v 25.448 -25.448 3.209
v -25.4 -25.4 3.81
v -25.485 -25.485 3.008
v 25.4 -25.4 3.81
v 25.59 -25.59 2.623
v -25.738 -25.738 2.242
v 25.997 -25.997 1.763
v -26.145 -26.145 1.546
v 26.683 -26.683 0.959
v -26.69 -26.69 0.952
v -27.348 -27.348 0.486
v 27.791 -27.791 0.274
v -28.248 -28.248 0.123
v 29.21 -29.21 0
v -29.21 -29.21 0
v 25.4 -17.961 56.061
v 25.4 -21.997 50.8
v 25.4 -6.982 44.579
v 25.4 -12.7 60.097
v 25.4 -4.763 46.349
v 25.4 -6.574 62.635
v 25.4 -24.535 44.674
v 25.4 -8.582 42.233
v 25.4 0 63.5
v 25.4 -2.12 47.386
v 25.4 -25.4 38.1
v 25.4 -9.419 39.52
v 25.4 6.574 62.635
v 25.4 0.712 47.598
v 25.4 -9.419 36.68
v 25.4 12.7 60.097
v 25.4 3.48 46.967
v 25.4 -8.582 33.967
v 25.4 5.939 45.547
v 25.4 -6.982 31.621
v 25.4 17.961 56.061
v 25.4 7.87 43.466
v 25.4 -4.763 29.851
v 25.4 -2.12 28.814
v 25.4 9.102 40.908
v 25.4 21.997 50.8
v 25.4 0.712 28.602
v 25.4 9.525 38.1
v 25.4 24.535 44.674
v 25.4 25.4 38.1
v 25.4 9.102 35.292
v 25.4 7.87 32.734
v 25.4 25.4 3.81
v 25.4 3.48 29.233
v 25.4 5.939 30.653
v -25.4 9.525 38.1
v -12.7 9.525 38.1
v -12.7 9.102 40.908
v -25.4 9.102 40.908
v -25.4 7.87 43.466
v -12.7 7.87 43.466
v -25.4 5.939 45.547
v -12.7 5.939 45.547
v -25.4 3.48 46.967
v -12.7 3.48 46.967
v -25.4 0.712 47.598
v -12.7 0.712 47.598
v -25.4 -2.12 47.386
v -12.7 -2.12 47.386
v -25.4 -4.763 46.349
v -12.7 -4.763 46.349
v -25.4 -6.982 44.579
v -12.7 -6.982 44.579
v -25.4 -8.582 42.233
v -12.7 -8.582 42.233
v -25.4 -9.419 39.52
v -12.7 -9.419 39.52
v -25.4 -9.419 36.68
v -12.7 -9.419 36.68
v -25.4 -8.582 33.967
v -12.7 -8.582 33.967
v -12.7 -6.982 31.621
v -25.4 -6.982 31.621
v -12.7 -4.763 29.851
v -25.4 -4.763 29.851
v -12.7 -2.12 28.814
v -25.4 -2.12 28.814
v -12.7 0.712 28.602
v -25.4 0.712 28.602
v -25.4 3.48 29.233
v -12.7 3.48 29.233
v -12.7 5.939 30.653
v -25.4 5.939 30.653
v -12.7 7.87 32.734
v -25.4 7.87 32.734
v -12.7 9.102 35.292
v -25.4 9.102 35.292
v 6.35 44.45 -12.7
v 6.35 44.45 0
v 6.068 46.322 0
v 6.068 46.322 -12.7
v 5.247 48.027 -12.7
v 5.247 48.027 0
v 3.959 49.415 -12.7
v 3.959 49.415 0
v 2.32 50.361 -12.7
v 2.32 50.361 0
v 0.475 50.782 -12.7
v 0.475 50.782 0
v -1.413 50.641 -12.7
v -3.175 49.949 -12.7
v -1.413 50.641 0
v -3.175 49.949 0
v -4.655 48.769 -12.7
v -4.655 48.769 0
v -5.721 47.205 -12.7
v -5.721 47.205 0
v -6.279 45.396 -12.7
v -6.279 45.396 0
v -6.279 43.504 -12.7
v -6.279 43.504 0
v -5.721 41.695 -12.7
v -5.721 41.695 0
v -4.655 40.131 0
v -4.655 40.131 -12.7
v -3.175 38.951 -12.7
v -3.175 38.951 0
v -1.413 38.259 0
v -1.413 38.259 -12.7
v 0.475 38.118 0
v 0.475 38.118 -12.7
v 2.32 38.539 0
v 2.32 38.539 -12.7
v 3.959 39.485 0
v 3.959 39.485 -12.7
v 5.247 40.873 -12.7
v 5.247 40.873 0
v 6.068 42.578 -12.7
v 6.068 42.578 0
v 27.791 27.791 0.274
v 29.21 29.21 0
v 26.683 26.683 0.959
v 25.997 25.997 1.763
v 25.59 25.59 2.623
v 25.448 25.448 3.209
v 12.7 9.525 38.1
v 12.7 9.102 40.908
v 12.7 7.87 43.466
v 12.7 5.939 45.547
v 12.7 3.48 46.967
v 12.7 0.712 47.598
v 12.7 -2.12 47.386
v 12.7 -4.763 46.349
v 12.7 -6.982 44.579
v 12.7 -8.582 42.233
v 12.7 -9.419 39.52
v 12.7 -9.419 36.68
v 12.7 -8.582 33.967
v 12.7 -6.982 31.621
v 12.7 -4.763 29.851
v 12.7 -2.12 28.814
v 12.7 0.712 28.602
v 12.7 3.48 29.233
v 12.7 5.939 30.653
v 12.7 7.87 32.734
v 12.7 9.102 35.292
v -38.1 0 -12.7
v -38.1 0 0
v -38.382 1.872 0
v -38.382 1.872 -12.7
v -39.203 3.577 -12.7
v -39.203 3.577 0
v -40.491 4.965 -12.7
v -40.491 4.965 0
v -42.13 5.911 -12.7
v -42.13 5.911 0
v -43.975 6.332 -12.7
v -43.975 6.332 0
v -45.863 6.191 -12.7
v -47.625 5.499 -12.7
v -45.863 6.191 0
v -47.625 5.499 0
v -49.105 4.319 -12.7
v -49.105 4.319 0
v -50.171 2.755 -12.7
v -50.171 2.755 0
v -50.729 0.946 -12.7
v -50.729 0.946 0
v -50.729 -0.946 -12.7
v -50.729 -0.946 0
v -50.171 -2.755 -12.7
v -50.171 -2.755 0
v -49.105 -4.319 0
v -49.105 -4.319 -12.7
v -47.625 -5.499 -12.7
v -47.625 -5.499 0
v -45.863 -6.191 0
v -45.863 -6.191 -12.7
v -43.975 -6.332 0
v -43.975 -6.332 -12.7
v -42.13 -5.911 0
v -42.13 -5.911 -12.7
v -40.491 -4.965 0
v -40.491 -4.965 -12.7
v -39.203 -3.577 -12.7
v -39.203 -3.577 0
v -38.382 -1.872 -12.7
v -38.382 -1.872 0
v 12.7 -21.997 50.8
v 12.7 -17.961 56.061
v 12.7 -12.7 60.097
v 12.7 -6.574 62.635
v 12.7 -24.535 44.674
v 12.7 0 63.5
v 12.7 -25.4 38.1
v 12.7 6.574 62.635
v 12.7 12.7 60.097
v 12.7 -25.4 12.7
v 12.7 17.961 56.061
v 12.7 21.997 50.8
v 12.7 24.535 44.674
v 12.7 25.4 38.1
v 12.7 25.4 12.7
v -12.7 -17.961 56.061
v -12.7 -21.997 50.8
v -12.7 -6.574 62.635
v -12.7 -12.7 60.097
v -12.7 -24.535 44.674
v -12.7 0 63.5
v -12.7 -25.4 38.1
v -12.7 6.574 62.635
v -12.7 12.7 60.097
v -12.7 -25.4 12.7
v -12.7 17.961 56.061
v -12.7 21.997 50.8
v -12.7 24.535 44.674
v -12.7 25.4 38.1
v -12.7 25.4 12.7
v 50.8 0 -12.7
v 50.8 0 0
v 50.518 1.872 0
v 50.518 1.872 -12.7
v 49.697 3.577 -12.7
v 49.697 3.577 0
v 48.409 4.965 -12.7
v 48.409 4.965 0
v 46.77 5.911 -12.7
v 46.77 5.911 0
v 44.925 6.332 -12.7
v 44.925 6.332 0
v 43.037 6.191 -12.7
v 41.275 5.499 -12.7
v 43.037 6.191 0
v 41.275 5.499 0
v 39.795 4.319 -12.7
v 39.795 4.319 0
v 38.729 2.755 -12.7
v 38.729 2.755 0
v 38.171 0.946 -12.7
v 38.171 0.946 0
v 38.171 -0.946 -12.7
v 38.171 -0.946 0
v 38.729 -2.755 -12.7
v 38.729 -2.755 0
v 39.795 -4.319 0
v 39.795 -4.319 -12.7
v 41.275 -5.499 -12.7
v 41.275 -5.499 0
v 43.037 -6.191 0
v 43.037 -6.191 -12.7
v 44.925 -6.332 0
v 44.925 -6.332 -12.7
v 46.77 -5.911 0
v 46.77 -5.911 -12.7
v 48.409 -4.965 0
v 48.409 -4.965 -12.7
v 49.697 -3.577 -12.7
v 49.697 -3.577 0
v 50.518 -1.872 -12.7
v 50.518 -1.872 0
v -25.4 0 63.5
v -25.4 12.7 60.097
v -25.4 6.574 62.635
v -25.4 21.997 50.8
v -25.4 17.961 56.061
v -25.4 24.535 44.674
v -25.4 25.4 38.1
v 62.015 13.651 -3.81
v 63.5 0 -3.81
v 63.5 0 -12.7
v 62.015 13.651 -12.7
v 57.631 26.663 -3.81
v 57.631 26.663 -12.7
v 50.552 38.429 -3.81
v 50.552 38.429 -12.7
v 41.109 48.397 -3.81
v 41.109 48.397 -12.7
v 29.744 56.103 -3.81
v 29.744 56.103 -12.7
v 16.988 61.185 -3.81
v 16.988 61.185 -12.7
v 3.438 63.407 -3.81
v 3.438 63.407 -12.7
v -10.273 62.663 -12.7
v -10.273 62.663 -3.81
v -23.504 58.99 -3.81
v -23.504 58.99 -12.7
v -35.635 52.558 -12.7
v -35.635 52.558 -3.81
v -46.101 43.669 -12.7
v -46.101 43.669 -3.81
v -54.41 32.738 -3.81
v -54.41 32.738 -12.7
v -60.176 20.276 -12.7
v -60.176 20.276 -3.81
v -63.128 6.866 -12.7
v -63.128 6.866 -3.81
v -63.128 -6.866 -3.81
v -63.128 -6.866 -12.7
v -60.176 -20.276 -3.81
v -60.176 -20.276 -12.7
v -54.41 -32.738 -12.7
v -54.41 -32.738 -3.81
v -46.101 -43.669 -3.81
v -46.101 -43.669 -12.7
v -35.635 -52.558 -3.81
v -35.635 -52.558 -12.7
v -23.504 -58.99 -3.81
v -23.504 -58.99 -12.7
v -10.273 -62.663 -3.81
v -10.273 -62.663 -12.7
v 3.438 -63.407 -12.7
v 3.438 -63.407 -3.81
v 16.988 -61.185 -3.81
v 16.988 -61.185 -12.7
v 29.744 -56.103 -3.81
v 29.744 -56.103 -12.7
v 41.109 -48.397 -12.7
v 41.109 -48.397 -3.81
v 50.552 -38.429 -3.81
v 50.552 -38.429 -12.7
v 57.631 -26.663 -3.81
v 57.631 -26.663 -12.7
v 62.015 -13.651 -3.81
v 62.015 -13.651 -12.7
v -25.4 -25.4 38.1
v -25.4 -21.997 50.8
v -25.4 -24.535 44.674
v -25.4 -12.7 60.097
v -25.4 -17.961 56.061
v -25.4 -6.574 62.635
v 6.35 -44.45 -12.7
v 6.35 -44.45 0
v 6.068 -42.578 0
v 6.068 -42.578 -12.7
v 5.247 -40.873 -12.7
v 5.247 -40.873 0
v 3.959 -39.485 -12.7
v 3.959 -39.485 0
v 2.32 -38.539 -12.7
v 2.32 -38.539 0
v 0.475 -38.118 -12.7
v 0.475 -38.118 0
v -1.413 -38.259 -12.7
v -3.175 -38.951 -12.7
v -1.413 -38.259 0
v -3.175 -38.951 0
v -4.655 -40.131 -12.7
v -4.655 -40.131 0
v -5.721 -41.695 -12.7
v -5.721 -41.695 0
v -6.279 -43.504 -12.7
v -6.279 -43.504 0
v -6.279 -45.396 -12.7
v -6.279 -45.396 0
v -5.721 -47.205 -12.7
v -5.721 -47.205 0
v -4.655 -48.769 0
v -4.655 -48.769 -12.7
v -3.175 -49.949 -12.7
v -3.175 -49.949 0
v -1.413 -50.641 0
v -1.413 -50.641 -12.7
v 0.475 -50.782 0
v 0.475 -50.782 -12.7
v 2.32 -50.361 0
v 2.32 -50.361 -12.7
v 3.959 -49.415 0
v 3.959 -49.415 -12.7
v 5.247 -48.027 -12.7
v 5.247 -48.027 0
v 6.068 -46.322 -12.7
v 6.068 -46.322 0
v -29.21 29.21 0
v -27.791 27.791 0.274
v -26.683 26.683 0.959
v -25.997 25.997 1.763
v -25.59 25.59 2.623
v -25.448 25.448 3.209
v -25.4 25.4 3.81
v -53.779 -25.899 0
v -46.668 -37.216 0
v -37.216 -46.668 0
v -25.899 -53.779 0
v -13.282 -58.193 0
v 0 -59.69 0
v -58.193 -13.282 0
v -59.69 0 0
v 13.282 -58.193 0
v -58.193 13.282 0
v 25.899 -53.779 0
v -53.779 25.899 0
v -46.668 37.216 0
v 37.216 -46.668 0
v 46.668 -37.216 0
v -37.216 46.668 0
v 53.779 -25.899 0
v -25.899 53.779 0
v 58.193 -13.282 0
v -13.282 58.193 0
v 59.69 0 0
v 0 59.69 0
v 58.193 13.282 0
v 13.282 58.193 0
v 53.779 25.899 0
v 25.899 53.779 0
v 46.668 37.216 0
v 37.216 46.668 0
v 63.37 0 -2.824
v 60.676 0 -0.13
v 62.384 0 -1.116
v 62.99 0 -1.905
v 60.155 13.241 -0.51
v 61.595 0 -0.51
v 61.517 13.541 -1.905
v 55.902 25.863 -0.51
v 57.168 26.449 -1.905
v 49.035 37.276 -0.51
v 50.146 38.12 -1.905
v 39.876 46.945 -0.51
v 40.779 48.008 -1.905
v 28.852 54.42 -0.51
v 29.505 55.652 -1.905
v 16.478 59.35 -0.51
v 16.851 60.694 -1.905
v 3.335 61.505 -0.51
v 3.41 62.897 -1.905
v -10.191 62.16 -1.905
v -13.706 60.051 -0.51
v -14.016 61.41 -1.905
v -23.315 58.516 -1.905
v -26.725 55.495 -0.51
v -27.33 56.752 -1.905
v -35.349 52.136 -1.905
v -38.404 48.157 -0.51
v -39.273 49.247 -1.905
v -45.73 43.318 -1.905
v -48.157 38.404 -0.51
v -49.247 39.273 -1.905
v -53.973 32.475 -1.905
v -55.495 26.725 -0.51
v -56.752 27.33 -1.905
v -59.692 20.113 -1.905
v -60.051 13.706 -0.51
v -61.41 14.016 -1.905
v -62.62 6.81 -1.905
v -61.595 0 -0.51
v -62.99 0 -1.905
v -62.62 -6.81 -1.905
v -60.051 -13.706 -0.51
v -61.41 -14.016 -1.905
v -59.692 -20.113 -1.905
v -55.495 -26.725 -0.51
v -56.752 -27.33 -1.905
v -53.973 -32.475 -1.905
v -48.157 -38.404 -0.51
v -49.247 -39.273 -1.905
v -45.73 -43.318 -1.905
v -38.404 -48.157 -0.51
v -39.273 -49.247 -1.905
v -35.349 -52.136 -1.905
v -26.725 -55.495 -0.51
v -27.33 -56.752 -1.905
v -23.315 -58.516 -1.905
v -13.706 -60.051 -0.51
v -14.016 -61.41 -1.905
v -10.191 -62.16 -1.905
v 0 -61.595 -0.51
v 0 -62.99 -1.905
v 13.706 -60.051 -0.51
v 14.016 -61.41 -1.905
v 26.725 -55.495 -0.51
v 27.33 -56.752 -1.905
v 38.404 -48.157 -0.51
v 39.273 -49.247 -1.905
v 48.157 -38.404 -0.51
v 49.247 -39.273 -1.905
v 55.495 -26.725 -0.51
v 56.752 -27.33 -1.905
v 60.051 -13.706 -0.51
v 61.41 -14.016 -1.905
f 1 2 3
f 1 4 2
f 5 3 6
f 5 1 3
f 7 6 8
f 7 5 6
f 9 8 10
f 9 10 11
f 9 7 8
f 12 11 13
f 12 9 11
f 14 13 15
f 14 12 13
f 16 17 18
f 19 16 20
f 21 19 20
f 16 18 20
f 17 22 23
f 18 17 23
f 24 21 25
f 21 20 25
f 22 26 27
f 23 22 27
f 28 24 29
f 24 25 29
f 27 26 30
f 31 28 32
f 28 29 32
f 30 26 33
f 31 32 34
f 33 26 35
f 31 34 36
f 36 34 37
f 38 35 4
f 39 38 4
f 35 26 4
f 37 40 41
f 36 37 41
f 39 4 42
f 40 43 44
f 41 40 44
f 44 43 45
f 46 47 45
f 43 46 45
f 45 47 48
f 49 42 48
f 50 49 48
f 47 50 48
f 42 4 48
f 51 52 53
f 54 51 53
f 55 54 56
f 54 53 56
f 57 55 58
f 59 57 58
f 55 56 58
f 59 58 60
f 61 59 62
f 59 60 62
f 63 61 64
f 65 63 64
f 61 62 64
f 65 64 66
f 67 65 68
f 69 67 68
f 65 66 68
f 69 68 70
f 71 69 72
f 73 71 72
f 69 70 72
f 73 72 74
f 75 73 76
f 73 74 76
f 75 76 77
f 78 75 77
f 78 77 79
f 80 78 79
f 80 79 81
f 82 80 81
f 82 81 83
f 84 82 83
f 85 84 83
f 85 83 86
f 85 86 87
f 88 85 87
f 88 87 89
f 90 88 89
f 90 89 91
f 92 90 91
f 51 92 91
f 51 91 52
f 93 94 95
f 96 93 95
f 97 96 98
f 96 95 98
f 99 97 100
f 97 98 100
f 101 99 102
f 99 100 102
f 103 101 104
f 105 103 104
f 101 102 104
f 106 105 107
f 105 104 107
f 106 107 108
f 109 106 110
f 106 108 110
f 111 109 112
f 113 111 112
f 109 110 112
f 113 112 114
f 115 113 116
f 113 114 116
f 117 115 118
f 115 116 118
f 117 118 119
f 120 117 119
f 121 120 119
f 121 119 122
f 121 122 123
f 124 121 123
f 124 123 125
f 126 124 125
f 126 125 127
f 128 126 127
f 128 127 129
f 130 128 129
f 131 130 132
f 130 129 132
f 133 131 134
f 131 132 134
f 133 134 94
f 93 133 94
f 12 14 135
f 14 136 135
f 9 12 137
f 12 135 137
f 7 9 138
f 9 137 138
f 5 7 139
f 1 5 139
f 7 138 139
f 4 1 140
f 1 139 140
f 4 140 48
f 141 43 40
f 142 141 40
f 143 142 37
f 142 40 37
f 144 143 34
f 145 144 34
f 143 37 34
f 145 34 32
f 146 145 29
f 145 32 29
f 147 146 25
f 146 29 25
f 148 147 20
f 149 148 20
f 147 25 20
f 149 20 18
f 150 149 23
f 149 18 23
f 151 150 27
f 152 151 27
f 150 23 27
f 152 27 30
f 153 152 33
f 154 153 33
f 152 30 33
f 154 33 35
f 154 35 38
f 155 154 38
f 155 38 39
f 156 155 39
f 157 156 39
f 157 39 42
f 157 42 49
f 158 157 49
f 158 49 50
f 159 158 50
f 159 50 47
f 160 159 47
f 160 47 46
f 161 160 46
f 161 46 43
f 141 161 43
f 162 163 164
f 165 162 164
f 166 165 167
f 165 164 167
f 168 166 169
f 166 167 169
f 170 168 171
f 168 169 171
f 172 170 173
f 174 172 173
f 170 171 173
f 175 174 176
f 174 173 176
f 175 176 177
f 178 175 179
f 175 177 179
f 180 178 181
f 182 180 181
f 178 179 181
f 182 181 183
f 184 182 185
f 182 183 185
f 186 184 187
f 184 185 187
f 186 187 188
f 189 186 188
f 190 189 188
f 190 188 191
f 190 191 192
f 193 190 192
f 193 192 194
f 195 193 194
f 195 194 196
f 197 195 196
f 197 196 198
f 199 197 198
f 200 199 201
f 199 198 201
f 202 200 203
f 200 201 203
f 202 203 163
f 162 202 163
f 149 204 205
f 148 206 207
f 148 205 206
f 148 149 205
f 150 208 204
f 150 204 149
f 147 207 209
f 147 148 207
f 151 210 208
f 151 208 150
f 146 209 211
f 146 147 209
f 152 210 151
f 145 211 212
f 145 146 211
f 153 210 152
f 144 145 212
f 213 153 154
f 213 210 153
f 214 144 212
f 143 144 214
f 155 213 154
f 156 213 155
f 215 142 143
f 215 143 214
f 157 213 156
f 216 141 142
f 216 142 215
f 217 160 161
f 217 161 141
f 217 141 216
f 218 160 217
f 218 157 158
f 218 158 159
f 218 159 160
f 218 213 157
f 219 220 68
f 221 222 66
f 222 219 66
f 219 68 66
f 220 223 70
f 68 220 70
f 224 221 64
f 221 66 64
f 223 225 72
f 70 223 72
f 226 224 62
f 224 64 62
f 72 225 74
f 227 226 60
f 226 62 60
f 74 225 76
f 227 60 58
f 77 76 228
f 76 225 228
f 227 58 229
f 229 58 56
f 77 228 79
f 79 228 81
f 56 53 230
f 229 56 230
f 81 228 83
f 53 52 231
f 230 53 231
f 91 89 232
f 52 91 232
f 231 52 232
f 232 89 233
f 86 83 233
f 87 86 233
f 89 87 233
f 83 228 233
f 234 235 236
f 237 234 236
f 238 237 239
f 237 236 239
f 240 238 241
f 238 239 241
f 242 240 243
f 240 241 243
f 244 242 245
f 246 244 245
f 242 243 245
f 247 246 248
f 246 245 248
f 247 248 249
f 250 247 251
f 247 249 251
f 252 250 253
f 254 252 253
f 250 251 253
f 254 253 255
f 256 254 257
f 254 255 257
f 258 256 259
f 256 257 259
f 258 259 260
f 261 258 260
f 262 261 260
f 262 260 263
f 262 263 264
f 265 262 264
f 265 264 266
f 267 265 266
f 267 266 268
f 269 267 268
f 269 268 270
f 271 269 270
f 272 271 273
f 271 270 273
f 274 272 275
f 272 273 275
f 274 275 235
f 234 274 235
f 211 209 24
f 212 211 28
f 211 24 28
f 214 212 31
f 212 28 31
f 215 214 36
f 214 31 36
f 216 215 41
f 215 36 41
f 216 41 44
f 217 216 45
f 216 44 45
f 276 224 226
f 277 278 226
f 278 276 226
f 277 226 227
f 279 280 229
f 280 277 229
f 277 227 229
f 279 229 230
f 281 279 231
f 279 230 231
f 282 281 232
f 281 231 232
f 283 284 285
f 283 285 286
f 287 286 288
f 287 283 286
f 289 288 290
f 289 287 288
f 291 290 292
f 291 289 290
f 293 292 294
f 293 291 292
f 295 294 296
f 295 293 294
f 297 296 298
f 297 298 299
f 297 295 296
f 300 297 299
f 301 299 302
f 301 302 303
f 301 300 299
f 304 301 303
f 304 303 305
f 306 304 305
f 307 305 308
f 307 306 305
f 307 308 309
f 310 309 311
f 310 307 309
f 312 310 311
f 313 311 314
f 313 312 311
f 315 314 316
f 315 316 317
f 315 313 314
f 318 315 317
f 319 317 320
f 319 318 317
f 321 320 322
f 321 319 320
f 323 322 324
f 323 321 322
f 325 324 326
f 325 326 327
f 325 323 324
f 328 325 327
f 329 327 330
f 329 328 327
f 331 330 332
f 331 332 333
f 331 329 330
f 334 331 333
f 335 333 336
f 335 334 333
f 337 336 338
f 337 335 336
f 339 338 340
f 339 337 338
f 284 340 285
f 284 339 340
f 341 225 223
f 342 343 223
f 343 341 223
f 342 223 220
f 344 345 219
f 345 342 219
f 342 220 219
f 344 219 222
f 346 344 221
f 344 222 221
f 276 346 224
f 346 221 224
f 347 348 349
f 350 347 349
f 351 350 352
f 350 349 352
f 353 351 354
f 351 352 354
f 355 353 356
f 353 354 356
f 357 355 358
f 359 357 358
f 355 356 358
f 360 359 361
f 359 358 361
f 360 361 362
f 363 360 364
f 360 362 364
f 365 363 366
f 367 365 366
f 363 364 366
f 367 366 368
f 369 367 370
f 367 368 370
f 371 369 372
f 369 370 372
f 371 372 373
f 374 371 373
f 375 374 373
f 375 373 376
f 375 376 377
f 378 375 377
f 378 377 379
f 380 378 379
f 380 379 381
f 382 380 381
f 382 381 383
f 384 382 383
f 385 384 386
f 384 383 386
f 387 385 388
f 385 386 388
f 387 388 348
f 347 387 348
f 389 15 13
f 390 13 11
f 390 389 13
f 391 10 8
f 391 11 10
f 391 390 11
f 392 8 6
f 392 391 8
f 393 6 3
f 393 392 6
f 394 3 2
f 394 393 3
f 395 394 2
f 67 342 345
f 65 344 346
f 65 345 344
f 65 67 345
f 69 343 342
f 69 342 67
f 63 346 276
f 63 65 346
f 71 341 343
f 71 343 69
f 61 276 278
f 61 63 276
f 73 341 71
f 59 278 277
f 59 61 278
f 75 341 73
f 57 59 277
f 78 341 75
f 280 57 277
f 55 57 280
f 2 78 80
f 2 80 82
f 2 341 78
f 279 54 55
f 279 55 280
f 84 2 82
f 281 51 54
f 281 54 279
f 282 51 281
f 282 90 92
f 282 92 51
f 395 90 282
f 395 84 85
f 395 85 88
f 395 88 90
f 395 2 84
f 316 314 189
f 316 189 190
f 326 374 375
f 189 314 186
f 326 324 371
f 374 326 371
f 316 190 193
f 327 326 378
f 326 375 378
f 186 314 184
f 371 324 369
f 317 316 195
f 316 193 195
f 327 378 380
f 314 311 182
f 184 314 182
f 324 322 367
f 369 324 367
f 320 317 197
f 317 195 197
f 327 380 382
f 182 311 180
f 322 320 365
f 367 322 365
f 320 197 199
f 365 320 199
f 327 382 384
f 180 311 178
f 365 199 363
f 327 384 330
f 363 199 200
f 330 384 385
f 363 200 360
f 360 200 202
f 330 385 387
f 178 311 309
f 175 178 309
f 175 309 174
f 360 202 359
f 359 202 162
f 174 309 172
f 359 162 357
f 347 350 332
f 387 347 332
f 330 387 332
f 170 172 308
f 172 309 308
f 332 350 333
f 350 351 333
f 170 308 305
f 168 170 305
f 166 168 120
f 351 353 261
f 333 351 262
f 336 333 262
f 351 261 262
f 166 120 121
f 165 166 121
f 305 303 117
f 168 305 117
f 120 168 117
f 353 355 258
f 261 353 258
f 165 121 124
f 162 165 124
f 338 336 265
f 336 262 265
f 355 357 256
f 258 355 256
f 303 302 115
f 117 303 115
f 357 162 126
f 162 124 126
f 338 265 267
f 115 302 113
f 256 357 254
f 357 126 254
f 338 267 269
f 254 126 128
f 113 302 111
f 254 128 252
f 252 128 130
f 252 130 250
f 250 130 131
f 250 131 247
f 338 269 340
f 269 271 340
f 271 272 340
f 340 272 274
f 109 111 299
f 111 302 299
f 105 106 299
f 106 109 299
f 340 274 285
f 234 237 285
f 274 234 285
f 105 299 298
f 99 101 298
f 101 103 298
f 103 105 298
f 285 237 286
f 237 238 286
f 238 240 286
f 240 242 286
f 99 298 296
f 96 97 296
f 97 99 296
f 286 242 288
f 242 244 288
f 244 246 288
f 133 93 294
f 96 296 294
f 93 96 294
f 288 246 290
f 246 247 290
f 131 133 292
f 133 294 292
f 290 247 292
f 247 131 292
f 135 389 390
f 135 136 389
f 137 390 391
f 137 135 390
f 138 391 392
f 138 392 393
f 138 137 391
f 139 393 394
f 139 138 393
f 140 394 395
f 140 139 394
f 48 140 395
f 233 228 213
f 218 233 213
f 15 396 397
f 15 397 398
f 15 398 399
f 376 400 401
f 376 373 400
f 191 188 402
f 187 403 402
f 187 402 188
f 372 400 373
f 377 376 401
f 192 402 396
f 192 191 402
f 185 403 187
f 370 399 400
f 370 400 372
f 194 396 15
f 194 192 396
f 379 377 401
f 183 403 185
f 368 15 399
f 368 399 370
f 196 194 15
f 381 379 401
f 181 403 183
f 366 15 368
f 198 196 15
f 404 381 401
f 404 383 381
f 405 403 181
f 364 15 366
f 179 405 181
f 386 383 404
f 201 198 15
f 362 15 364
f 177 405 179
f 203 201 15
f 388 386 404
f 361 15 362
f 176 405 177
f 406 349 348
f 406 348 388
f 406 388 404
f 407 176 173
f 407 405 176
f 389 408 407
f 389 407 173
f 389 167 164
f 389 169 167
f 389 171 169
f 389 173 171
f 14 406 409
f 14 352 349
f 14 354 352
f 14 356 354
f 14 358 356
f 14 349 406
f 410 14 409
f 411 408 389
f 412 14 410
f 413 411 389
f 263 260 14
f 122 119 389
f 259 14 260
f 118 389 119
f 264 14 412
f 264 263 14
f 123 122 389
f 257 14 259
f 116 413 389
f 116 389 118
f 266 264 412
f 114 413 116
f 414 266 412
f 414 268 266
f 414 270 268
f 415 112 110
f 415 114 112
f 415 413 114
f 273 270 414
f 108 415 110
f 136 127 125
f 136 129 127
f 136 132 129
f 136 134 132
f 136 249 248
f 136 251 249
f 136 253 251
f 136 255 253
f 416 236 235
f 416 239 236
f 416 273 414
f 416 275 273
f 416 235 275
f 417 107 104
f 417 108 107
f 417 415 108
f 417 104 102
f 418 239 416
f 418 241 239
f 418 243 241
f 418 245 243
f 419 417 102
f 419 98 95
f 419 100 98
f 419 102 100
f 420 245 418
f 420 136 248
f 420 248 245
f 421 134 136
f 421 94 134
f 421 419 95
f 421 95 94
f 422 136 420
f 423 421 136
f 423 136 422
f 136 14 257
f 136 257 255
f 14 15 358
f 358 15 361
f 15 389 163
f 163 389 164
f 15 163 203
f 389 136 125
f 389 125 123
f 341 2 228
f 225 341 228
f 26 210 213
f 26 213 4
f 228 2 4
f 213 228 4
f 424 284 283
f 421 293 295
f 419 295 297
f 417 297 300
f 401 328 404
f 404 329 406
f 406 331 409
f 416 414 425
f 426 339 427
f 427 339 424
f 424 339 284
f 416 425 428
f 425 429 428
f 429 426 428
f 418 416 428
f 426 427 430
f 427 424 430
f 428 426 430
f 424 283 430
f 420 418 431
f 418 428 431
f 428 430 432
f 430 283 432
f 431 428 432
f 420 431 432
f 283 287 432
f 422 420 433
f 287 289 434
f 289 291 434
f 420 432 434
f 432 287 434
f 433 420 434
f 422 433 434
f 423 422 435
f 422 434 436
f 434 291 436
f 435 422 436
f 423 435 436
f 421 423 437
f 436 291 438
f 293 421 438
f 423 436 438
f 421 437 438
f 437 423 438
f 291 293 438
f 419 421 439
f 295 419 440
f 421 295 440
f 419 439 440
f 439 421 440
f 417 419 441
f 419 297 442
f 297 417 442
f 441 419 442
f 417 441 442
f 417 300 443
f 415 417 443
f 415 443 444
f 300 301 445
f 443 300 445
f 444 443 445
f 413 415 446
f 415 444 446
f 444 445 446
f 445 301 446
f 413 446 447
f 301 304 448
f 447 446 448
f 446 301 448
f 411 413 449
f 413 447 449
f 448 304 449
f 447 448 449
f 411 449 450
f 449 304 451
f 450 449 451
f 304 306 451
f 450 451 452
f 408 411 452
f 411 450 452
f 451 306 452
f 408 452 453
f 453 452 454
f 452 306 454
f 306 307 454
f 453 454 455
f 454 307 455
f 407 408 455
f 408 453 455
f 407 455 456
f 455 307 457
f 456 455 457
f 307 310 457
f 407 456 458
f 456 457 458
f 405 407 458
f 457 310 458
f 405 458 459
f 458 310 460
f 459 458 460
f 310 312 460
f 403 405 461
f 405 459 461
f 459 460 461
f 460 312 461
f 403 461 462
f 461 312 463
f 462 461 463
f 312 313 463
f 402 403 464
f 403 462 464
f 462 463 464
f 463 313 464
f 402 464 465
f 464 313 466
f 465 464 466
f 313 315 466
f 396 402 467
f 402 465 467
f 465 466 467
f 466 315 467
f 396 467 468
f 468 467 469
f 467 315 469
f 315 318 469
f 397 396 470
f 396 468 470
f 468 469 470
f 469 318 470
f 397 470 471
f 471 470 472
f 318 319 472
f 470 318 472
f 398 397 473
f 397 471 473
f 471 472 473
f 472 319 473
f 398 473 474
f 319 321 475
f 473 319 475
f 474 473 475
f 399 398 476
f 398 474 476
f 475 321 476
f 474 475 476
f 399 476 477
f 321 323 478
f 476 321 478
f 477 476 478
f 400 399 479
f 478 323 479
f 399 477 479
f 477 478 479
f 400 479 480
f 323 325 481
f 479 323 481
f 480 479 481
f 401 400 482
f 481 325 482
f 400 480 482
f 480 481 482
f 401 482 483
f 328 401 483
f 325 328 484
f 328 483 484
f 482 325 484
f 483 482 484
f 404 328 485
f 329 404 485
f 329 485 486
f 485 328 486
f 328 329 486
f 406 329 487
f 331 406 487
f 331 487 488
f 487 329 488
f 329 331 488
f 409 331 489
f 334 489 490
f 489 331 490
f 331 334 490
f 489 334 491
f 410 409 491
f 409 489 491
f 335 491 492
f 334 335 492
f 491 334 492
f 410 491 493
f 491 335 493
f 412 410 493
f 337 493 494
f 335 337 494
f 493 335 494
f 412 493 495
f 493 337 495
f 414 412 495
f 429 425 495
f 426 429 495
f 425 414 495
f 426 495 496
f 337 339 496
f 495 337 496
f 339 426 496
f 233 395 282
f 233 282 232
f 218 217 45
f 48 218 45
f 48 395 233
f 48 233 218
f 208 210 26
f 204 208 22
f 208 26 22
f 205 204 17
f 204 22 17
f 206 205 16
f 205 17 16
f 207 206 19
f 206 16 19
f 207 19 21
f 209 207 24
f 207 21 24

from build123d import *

# Parameters (mm, degrees)
F0_R     = 63.5
F0_R_2   = 6.35
F0_W     = 12.7
F0_H     = 50.8
F0_W_2   = 25.4
F1_DEPTH = 12.7
F2_DEPTH = 63.5
F3_DEPTH = 12.7
F5_DEPTH = 88.901
F4_R     = 9.525
F6_DEPTH = 88.901
F7_R     = 3.81


with BuildPart() as f1:
    # F0 (on Top) → F1 (new body)
    with BuildSketch(Plane.XY):
        Circle(F0_R)
        with Locations((0, -44.45)):
            Circle(F0_R_2, mode=Mode.SUBTRACT)
        with Locations((-44.45, 0)):
            Circle(F0_R_2, mode=Mode.SUBTRACT)
        Polygon((-25.4, -25.4), (-25.4, 25.4), (-12.7, 25.4), (12.7, 25.4), (25.4, 25.4), (25.4, -25.4), (12.7, -25.4), (-12.7, -25.4), align=None, mode=Mode.SUBTRACT)
        with Locations((44.45, 0)):
            Circle(F0_R_2, mode=Mode.SUBTRACT)
        with Locations((0, 44.45)):
            Circle(F0_R_2, mode=Mode.SUBTRACT)
        with Locations((-19.05, 0)):
            Rectangle(F0_W, F0_H)
        Rectangle(F0_W_2, F0_H)
        with Locations((19.05, 0)):
            Rectangle(F0_W, F0_H)
    extrude(amount=-F1_DEPTH)

    # F0 (on Top) → F2 (join)
    with BuildSketch(Plane.XY):
        with Locations((-19.05, 0)):
            Rectangle(F0_W, F0_H)
        with Locations((19.05, 0)):
            Rectangle(F0_W, F0_H)
    extrude(amount=F2_DEPTH)

    # F0 (on Top) → F3 (join)
    with BuildSketch(Plane.XY):
        Rectangle(F0_W_2, F0_H)
    extrude(amount=F3_DEPTH)

    # F4 (on face) → F5 (cut, through all)
    with BuildSketch(Plane.YZ.offset(25.4)):
        with BuildLine():
            Line((-25.4, 63.5), (-25.4, 38.1))
            ThreePointArc((-25.4, 38.1), (-17.960512, 56.060512), (0, 63.5))
            Line((0, 63.5), (-25.4, 63.5))
        make_face()
        with BuildLine():
            ThreePointArc((0, 63.5), (17.960512, 56.060512), (25.4, 38.1))
            Line((25.4, 38.1), (25.4, 63.5))
            Line((25.4, 63.5), (0, 63.5))
        make_face()
    extrude(amount=-F5_DEPTH, mode=Mode.SUBTRACT)

    # F4 (on face) → F6 (cut, through all)
    with BuildSketch(Plane.YZ.offset(25.4)):
        with Locations((0, 38.1)):
            Circle(F4_R)
    extrude(amount=-F6_DEPTH, mode=Mode.SUBTRACT)

    # F7
    f7_edges = [f1.edges().sort_by_distance(p)[0] for p in [
        (25.4, 0, 0),
        (0, -25.4, 0),
        (-25.4, 0, 0),
        (0, 25.4, 0),
        (-63.5, 0, 0),
    ]]
    fillet(f7_edges, radius=F7_R)


solid = f1.part
